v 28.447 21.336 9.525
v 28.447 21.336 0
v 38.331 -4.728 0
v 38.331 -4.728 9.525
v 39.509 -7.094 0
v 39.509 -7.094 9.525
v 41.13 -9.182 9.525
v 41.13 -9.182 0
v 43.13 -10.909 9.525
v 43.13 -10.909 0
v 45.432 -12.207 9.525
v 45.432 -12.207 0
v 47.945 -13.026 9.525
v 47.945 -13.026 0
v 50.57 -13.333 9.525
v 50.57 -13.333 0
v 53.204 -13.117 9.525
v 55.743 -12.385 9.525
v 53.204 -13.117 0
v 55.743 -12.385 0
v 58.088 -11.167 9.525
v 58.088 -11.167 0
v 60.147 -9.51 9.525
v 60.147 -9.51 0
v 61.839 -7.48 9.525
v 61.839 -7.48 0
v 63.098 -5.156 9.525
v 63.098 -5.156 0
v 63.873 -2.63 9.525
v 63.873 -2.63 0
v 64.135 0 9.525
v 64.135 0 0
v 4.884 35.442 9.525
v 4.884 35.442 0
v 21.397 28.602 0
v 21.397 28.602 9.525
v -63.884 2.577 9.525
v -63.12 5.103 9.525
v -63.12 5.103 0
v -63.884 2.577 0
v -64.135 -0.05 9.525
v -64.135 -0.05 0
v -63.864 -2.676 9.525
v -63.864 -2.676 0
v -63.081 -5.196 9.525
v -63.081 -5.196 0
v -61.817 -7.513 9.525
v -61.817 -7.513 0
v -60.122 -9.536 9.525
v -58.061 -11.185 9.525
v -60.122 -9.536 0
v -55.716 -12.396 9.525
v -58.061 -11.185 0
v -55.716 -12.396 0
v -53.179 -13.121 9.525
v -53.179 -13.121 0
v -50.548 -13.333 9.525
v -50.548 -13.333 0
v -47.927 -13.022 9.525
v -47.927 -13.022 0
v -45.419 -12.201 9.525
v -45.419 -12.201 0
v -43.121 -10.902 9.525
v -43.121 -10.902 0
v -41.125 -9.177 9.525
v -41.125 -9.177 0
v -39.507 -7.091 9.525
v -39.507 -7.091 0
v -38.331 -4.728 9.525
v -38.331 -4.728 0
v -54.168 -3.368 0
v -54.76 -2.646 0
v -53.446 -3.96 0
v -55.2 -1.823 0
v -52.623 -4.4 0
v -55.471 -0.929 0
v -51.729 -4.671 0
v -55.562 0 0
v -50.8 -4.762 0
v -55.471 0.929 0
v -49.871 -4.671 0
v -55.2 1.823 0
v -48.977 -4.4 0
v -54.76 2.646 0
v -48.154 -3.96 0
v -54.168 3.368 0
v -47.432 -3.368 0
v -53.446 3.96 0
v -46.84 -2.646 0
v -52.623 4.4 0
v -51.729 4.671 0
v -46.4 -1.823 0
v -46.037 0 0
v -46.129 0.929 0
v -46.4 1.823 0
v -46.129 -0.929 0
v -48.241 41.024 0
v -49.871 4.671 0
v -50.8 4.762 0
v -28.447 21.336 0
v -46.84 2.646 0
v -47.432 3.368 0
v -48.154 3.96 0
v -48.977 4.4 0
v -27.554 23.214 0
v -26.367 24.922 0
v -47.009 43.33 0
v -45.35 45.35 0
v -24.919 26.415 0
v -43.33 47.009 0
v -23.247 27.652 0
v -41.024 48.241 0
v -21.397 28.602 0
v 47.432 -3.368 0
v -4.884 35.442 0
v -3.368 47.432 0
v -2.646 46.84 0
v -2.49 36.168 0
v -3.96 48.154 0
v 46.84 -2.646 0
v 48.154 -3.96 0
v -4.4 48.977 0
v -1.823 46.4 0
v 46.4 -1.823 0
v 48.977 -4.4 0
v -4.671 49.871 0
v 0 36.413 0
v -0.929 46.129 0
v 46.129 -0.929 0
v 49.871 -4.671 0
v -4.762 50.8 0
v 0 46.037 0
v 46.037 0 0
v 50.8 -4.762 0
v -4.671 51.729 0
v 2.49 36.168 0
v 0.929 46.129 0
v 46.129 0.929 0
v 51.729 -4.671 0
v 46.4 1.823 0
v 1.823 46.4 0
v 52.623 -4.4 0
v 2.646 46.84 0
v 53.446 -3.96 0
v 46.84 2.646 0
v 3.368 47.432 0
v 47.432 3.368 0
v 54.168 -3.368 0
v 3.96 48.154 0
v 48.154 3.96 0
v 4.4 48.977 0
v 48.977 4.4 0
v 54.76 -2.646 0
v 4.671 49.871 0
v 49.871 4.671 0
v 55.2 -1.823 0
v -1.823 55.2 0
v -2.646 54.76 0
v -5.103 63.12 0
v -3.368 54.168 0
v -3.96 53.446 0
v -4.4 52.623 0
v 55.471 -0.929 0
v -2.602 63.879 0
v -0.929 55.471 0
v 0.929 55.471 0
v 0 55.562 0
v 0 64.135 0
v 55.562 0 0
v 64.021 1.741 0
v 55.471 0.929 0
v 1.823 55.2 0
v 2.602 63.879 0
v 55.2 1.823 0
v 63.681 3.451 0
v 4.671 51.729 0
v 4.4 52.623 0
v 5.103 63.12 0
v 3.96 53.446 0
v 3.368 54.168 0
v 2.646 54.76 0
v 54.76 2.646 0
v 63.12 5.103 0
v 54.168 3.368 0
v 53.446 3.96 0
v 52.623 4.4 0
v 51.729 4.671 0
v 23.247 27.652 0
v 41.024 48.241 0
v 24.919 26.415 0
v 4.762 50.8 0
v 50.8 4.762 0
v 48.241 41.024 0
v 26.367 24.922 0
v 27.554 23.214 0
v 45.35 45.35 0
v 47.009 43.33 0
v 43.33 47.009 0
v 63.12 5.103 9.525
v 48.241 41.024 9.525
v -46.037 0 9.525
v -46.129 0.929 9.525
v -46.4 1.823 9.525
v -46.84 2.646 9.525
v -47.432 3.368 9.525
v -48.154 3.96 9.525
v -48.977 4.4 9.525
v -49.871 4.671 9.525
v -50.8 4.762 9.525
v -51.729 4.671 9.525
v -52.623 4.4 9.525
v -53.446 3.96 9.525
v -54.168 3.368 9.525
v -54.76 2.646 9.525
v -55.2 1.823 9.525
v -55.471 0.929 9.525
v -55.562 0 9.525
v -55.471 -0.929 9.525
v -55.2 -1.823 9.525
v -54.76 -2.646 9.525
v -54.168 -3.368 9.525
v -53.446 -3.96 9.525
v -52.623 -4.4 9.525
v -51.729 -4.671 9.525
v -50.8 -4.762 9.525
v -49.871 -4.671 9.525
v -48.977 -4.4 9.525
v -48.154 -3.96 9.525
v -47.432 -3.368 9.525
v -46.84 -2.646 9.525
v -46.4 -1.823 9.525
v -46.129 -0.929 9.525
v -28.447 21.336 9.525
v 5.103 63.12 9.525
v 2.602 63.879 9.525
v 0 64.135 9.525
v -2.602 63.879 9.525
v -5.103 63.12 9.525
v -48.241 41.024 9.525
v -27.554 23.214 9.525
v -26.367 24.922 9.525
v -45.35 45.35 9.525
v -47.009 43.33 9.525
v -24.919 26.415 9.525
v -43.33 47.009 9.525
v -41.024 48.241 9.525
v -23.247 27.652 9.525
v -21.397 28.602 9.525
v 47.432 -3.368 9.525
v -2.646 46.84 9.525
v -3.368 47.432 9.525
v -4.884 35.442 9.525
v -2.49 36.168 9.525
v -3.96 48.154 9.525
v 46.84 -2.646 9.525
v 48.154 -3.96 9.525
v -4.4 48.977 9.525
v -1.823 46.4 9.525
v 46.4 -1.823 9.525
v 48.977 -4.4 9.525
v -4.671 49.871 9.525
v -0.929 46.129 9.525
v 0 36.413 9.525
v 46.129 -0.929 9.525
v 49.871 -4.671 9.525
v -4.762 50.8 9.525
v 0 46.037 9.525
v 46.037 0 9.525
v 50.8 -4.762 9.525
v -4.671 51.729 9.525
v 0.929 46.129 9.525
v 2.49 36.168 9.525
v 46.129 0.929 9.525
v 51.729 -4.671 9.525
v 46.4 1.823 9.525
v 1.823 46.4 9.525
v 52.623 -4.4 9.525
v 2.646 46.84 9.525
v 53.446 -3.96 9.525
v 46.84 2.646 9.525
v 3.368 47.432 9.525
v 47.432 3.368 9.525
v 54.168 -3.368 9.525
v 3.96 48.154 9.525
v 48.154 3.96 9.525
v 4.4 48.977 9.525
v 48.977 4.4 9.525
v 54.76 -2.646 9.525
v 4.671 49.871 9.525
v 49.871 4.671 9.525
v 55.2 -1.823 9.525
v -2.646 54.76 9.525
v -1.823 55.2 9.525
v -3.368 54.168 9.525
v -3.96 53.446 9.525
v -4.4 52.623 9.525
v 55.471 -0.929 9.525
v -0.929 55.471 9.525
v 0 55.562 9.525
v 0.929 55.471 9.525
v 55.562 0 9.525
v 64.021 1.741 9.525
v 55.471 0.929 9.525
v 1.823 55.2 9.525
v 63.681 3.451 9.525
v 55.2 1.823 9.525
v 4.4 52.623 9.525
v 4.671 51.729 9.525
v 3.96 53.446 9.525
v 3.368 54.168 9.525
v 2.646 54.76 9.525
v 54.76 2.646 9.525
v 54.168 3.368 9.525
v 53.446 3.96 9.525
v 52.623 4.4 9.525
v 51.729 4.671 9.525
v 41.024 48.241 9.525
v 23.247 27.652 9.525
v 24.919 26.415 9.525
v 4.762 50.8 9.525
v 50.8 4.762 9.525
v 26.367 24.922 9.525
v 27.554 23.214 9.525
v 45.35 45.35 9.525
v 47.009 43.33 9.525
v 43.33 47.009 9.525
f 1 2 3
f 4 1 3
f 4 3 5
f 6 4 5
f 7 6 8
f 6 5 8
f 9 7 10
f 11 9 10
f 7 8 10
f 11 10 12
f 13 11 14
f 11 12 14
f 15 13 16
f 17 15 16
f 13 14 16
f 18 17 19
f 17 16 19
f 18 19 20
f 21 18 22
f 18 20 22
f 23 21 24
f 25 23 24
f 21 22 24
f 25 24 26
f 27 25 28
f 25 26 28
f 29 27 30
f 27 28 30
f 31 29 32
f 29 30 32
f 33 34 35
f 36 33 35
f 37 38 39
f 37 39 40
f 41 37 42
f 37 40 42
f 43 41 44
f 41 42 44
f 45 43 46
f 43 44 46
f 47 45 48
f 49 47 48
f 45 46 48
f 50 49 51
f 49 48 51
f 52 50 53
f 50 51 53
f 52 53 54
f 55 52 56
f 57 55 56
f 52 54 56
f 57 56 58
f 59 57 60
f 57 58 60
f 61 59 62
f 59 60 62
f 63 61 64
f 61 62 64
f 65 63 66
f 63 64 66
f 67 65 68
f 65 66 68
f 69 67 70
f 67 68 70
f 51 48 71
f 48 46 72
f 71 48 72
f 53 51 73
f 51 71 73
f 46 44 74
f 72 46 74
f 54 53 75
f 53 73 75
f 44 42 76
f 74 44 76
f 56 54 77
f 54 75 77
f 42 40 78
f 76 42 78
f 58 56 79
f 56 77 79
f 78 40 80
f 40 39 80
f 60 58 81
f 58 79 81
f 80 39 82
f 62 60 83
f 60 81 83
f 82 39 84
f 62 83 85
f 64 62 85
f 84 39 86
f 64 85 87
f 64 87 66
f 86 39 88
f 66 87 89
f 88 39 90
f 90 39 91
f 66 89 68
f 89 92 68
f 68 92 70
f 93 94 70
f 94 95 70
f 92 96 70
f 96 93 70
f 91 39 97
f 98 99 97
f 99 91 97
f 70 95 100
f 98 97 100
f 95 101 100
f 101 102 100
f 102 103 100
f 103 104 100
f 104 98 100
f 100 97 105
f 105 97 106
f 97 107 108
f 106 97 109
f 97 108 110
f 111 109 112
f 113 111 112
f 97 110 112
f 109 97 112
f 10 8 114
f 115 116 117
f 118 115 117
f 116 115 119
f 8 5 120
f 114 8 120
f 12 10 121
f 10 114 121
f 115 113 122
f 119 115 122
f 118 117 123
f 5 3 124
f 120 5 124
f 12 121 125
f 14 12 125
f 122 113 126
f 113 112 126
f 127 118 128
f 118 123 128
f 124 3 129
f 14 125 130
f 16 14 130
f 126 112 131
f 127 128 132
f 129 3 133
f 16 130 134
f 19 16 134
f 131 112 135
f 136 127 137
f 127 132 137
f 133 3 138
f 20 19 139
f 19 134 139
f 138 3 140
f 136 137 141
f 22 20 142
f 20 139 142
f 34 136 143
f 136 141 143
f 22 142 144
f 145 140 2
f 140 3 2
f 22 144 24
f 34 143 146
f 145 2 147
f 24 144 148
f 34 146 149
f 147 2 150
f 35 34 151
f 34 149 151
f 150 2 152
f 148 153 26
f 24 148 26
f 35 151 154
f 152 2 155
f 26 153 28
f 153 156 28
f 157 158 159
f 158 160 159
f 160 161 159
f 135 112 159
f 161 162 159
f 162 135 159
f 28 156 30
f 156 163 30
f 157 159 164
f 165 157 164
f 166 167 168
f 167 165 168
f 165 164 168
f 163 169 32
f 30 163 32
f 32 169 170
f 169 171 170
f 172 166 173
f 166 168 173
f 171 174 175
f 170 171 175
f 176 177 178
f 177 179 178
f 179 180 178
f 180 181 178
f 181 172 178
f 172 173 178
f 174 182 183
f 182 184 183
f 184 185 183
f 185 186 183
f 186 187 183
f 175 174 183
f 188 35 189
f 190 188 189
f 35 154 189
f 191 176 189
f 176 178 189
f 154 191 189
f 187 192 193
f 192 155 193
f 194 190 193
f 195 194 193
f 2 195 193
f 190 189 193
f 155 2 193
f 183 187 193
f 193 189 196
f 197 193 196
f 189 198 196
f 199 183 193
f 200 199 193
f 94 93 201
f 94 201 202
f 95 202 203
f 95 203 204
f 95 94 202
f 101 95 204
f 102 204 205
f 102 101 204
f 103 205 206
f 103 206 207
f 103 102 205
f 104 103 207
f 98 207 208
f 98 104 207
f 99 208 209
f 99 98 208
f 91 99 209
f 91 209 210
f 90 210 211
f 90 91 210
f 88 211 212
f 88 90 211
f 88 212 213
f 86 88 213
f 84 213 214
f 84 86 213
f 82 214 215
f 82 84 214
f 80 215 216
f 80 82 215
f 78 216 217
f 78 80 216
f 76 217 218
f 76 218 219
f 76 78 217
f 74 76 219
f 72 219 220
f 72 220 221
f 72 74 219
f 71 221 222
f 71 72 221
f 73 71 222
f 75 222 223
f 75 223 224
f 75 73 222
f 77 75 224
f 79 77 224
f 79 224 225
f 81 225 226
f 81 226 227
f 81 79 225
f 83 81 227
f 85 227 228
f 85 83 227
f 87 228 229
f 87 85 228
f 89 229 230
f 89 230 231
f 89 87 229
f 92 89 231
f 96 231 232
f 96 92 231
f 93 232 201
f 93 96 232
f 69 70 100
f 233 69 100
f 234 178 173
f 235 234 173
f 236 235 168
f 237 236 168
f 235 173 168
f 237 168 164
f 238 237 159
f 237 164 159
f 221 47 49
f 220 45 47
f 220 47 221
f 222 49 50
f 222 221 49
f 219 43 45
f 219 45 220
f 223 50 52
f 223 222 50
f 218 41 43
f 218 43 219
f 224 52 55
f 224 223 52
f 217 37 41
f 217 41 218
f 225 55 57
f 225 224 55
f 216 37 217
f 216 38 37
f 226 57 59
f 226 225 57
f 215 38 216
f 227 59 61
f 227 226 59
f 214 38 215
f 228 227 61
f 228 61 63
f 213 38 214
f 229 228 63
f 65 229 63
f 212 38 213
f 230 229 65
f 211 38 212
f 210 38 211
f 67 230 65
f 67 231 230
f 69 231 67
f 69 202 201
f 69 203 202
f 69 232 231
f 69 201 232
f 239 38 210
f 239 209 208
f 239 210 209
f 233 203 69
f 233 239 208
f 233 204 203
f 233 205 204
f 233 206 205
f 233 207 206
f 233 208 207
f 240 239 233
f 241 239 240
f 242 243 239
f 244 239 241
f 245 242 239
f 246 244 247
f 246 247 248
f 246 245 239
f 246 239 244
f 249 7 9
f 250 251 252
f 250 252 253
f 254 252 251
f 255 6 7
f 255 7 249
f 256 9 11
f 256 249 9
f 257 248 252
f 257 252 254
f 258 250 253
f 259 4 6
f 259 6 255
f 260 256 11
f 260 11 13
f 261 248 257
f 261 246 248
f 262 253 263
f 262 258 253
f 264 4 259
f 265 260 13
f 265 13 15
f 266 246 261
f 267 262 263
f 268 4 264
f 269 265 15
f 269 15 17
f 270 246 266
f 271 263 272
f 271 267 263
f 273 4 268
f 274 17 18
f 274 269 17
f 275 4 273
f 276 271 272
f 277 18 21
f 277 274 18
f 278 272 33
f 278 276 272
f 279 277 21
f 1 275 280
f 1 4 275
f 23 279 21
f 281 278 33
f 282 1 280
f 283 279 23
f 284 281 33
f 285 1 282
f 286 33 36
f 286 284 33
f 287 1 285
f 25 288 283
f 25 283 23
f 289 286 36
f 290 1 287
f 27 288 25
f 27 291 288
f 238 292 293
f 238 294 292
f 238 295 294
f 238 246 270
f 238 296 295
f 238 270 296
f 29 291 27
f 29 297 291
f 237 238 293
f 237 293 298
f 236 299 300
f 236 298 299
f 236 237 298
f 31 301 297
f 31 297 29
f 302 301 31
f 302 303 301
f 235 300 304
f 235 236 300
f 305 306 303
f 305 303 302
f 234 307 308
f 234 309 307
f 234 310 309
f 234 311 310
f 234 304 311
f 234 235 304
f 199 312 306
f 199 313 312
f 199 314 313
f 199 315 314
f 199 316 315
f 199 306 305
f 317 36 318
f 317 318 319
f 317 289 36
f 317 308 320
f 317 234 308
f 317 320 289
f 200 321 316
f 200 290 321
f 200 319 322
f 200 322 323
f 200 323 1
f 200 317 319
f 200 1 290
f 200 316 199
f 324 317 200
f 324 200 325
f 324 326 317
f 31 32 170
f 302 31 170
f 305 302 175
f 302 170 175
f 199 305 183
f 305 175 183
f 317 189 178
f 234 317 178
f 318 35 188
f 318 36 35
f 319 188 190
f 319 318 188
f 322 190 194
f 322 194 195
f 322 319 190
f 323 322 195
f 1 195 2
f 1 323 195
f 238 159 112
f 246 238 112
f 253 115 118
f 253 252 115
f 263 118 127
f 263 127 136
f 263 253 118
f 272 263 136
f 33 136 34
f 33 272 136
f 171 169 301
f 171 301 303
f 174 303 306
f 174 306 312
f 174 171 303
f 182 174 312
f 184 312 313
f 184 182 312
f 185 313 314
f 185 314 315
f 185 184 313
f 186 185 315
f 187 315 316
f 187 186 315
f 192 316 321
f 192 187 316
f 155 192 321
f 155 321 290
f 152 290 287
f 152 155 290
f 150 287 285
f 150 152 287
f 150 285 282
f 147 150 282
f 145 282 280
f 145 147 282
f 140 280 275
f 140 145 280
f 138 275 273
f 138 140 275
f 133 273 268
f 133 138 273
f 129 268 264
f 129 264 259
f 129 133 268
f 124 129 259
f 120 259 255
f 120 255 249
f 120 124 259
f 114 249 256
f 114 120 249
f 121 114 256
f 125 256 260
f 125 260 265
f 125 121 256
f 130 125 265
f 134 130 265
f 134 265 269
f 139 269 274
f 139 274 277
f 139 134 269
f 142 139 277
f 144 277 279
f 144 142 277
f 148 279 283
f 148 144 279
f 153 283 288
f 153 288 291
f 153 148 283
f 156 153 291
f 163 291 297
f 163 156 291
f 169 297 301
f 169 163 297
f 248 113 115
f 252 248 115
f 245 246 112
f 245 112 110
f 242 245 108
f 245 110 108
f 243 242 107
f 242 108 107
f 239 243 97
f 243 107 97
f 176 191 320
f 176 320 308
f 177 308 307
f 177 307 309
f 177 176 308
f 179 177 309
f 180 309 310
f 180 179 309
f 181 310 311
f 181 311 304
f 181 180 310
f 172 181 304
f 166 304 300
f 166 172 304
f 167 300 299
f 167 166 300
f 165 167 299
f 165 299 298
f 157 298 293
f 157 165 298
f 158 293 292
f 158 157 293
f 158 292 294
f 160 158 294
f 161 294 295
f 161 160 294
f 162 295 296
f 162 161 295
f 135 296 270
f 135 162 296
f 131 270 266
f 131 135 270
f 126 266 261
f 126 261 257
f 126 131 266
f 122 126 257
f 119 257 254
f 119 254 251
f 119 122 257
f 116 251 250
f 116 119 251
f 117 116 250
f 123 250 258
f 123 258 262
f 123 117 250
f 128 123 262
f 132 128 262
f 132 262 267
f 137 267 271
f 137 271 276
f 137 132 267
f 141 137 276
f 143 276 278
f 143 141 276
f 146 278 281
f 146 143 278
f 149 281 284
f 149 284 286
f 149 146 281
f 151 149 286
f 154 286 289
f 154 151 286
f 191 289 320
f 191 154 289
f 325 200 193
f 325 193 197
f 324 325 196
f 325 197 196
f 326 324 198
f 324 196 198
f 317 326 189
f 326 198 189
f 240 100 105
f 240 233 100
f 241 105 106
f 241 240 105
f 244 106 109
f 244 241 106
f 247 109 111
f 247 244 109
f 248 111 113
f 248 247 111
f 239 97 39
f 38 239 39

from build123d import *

# Parameters (mm, degrees)
F0_R     = 4.7625
F1_DEPTH = 9.525
F2_R     = 12.7635


with BuildPart() as f1:
    # F0 (on Top) → F1 (new body)
    with BuildSketch(Plane.XY):
        with BuildLine():
            ThreePointArc((-38.331487, -4.728468), (-37.68341, -2.403602), (-37.465, 0))
            ThreePointArc((-37.465, 0), (-48.198471, 13.078772), (-63.119934, 5.103084))
            ThreePointArc((-63.119934, 5.103084), (-55.716337, -12.395638), (-38.331487, -4.728468))
        make_face()
        with Locations((-50.8, 0)):
            Circle(F0_R, mode=Mode.SUBTRACT)
        with BuildLine():
            ThreePointArc((-63.119934, 5.103084), (-48.198471, 13.078772), (-37.465, 0))
            ThreePointArc((-37.465, 0), (-37.68341, -2.403602), (-38.331487, -4.728468))
            Line((-38.331487, -4.728468), (-26.491756, 26.491756))
            ThreePointArc((-26.491756, 26.491756), (-43.329554, 24.833377), (-48.240958, 41.024108))
            Line((-48.240958, 41.024108), (-63.119934, 5.103084))
        make_face()
        with BuildLine():
            ThreePointArc((-41.024108, 48.240958), (-45.350293, 45.350293), (-48.240958, 41.024108))
            ThreePointArc((-48.240958, 41.024108), (-43.329554, 24.833377), (-26.491756, 26.491756))
            ThreePointArc((-26.491756, 26.491756), (-23.601091, 30.817941), (-22.586024, 35.921024))
            ThreePointArc((-22.586024, 35.921024), (-28.512495, 47.008672), (-41.024108, 48.240958))
        make_face()
        with BuildLine():
            ThreePointArc((-22.586024, 35.921024), (-23.601091, 30.817941), (-26.491756, 26.491756))
            Line((-26.491756, 26.491756), (0, 37.465))
            ThreePointArc((0, 37.465), (-13.078772, 48.198471), (-5.103084, 63.119934))
            Line((-5.103084, 63.119934), (-41.024108, 48.240958))
            ThreePointArc((-41.024108, 48.240958), (-28.512495, 47.008672), (-22.586024, 35.921024))
        make_face()
        with BuildLine():
            ThreePointArc((-5.103084, 63.119934), (-13.078772, 48.198471), (0, 37.465))
            ThreePointArc((0, 37.465), (9.429269, 41.370731), (13.335, 50.8))
            ThreePointArc((13.335, 50.8), (11.087647, 58.208529), (5.103084, 63.119934))
            ThreePointArc((5.103084, 63.119934), (0, 64.135), (-5.103084, 63.119934))
        make_face()
        with Locations((0, 50.8)):
            Circle(F0_R, mode=Mode.SUBTRACT)
        with BuildLine():
            ThreePointArc((13.335, 50.8), (9.429269, 41.370731), (0, 37.465))
            Line((0, 37.465), (26.491756, 26.491756))
            ThreePointArc((26.491756, 26.491756), (24.833377, 43.329554), (41.024108, 48.240958))
            Line((41.024108, 48.240958), (5.103084, 63.119934))
            ThreePointArc((5.103084, 63.119934), (11.087647, 58.208529), (13.335, 50.8))
        make_face()
        with BuildLine():
            ThreePointArc((41.024108, 48.240958), (24.833377, 43.329554), (26.491756, 26.491756))
            ThreePointArc((26.491756, 26.491756), (41.024108, 23.601091), (49.256024, 35.921024))
            ThreePointArc((49.256024, 35.921024), (48.999796, 38.522554), (48.240958, 41.024108))
            ThreePointArc((48.240958, 41.024108), (45.350293, 45.350293), (41.024108, 48.240958))
        make_face()
        with BuildLine():
            ThreePointArc((49.256024, 35.921024), (41.024108, 23.601091), (26.491756, 26.491756))
            Line((26.491756, 26.491756), (38.331487, -4.728468))
            ThreePointArc((38.331487, -4.728468), (45.883663, 12.395638), (63.119934, 5.103084))
            Line((63.119934, 5.103084), (48.240958, 41.024108))
            ThreePointArc((48.240958, 41.024108), (48.999796, 38.522554), (49.256024, 35.921024))
        make_face()
        with BuildLine():
            ThreePointArc((63.119934, 5.103084), (45.883663, 12.395638), (38.331487, -4.728468))
            ThreePointArc((38.331487, -4.728468), (53.203602, -13.11659), (64.135, 0))
            ThreePointArc((64.135, 0), (63.878772, 2.601529), (63.119934, 5.103084))
        make_face()
        with Locations((50.8, 0)):
            Circle(F0_R, mode=Mode.SUBTRACT)
    extrude(amount=F1_DEPTH)

    # F2
    f2_edges = [f1.edges().sort_by_distance(p)[0] for p in [
        (-26.491756, 26.491756, 4.7625),
        (0, 37.465, 4.7625),
        (26.491756, 26.491756, 4.7625),
    ]]
    fillet(f2_edges, radius=F2_R)


solid = f1.part
